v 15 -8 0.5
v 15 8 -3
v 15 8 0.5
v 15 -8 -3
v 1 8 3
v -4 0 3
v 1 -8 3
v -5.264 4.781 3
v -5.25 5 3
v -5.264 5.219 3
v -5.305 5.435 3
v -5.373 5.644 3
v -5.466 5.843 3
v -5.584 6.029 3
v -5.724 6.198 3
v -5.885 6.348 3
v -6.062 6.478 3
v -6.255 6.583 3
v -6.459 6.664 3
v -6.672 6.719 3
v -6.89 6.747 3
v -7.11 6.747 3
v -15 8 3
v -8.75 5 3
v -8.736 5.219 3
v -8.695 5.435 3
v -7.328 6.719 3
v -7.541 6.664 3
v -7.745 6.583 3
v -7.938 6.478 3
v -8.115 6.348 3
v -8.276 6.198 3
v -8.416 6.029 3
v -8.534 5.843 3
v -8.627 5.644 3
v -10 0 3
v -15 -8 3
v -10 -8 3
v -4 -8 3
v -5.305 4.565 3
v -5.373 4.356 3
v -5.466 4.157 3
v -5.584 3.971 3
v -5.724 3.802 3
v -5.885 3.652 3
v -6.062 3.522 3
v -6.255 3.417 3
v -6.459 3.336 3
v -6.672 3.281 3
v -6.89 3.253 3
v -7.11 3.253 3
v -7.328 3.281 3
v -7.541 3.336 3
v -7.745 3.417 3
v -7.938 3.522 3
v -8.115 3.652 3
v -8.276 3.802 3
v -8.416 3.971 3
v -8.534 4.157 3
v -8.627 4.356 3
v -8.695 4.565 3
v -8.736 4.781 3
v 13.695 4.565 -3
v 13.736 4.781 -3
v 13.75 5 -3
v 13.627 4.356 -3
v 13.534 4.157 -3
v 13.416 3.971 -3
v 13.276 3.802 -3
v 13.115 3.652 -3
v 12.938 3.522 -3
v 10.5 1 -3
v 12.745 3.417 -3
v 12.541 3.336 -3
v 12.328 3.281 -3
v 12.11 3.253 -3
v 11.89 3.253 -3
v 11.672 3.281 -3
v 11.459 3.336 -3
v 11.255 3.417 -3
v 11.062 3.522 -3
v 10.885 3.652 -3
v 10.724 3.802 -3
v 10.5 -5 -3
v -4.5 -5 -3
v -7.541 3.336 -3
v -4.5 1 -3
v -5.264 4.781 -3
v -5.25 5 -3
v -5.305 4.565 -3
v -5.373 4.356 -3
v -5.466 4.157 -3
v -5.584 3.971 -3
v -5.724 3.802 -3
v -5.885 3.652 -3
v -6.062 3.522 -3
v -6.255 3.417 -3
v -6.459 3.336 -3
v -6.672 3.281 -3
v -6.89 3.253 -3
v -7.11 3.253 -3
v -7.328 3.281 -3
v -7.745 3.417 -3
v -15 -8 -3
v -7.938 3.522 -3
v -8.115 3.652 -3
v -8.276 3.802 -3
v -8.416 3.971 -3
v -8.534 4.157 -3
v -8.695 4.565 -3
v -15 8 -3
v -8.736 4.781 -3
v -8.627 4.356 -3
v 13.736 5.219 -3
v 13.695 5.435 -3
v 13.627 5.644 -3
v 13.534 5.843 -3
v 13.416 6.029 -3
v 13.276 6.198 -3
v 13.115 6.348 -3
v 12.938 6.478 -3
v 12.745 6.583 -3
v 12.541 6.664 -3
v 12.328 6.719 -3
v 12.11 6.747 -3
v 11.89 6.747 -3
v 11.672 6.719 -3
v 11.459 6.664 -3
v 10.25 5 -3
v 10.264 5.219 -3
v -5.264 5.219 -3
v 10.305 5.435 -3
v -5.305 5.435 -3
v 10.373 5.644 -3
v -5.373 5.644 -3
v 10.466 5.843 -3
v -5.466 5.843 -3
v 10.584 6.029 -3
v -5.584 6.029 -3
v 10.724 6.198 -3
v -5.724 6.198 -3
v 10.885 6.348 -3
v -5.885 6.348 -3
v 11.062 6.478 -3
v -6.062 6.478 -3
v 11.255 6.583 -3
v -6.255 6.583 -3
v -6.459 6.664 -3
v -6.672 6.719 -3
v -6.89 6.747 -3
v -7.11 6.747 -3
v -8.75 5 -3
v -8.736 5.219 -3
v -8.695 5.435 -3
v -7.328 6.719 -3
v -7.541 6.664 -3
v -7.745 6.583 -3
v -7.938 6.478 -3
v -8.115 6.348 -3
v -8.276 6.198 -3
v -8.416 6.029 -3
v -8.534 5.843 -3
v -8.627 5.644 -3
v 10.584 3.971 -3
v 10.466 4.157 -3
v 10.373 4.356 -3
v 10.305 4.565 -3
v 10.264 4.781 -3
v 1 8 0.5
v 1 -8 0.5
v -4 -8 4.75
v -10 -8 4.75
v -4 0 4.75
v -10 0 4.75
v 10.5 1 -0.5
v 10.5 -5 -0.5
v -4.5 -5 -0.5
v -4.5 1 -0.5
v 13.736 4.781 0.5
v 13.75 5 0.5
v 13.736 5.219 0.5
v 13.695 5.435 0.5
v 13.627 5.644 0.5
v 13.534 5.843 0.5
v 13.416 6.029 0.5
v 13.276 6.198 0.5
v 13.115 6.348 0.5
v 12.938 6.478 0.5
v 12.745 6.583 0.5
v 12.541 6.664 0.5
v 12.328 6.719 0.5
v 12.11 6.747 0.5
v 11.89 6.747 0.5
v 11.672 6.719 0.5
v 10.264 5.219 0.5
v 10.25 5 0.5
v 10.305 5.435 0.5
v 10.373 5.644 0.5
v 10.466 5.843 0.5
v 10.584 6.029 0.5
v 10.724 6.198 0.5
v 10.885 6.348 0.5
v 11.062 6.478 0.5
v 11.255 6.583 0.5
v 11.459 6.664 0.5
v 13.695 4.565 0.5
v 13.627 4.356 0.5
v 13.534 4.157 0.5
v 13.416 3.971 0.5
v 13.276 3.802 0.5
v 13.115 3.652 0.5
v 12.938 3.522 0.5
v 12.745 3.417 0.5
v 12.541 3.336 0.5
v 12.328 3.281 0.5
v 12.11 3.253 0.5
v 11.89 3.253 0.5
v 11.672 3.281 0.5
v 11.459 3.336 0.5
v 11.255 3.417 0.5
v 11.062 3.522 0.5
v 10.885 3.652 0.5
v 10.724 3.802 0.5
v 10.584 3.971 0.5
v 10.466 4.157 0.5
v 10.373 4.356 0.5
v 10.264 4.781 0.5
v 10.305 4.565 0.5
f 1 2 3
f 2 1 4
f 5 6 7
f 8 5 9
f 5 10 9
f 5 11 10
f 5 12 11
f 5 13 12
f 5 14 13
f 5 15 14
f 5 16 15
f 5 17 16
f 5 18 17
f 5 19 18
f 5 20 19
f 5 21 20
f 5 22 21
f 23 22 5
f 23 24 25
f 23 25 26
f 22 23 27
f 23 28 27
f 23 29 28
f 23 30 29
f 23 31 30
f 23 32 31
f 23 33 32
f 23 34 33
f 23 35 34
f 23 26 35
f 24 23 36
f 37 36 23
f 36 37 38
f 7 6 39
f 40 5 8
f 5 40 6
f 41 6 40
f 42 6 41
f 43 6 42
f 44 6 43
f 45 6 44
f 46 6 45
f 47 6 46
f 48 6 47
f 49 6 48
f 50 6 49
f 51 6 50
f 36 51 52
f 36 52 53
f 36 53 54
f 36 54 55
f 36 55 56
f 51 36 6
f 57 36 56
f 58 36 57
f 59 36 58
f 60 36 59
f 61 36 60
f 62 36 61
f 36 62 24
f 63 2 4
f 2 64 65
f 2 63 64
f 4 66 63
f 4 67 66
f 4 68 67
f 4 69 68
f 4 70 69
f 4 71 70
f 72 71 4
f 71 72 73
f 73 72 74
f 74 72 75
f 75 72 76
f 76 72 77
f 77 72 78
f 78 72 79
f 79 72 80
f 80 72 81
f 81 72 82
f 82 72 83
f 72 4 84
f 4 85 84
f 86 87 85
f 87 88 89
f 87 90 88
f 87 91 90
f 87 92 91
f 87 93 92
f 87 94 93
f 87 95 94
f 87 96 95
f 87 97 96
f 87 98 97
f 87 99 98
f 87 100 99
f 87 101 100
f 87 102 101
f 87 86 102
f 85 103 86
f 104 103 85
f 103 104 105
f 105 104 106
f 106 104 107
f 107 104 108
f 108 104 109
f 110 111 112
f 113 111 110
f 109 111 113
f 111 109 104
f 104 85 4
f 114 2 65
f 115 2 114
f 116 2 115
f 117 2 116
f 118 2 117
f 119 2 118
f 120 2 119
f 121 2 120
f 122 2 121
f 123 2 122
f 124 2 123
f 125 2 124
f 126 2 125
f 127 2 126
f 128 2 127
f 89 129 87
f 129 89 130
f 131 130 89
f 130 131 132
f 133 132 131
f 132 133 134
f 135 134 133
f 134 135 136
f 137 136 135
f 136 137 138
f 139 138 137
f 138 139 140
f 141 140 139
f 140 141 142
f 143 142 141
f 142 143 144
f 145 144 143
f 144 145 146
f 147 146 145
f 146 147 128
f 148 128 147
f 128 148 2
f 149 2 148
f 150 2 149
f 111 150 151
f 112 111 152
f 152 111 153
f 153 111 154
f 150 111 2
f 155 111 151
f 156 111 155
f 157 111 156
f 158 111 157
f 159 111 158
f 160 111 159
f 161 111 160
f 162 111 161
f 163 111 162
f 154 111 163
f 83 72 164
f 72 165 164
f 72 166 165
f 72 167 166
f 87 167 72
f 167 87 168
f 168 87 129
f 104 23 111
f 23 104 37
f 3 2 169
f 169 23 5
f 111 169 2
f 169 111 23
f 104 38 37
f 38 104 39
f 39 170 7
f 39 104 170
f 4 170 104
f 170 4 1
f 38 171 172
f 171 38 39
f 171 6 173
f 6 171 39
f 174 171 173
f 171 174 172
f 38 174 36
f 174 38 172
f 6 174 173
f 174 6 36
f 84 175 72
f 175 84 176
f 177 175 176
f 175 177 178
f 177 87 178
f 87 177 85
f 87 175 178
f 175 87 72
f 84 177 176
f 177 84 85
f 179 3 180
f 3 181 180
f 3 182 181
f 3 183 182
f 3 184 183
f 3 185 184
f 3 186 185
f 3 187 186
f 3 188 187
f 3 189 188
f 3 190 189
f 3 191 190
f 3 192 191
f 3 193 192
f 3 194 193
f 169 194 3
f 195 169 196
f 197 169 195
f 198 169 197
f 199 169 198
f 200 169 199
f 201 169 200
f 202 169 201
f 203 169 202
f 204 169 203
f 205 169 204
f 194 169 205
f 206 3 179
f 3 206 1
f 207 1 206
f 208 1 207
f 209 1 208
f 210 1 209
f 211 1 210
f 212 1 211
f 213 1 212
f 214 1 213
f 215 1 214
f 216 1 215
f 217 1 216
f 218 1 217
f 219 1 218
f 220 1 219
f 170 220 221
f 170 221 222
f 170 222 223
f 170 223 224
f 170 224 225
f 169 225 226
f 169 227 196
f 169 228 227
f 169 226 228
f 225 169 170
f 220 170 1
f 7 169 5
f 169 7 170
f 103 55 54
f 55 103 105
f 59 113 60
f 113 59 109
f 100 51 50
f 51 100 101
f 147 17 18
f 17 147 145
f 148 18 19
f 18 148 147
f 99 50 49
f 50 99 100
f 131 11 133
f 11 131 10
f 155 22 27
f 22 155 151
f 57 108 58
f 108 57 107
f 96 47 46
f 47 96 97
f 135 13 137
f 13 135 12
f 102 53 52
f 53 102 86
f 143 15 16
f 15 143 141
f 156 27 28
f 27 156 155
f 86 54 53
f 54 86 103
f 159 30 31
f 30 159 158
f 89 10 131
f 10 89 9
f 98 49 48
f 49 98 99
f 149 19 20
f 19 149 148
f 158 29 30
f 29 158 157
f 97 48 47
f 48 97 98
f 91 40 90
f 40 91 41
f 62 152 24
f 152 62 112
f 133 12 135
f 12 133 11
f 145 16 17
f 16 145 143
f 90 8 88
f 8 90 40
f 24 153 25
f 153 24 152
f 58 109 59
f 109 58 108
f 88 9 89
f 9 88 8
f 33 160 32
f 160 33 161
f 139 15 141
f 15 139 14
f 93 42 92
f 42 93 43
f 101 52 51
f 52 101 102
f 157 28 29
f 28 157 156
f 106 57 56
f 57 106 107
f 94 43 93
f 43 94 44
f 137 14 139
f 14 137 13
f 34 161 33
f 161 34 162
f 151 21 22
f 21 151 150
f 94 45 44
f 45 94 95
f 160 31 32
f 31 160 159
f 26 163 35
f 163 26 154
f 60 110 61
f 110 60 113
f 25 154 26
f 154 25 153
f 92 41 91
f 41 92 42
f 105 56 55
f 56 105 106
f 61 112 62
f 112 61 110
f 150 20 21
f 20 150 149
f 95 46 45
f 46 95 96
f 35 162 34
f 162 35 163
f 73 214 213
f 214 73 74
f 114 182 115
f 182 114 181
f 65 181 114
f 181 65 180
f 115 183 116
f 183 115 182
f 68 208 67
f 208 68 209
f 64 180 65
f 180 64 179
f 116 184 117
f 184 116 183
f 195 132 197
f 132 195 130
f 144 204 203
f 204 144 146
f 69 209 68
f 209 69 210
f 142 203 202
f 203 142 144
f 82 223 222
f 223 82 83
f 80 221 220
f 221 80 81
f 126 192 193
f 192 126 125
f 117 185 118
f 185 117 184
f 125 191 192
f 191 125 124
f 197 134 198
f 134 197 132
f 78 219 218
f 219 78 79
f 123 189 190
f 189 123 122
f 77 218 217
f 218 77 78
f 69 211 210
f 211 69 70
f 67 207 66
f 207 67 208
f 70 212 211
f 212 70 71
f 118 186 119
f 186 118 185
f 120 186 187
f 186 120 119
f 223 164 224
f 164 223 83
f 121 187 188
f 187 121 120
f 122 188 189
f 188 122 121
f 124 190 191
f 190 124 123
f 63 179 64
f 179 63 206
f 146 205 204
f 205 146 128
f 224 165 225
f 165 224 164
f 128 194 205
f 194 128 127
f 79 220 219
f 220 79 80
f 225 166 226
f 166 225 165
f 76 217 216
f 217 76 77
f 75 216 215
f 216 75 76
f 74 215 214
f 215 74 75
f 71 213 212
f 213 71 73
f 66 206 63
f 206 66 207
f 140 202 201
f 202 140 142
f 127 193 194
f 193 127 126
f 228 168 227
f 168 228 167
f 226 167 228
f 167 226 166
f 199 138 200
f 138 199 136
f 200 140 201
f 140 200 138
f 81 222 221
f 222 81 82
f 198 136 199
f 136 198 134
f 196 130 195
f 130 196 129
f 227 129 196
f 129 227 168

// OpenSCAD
// Author: GrAndAG

/* [Settings] */

// Thickness of holder (mm)
thickness = 6; // [3:0.5:25]

//Economical version (requires less plastic)
economical = 1; // [0:No, 1:Yes]

// Diameters of mount holes (mm)
mount_hole_diameter = 3.5; // [2.7:0.1:4.0]

/* [Hidden] */
// to avoid renderring glitches
eps = 0.05;

module end_stop_holder() {
	$fn=50;

	difference() {
        // main body with tip
		union() {
			cube([30, 16, thickness], center = true);
			translate([-7, -4, thickness/2])
				cube([6, 8, 3.5], center = true);
		}

        // hole for contacts on back side of PCB
		translate([3, -2, -thickness/2 + 1.25 - eps/4])
			cube([15, 6, 2.5+eps/2], center = true);

        //cut some unneeded plastic
        if(economical)
            translate([8+eps/4, 0, 3.5])
                cube([14+eps/2, 16+eps, thickness], center = true);

        // two mount holes
		translate([-7, 5, 0])
			cylinder(h=thickness+eps, d=mount_hole_diameter, center = true);
		translate([12, 5, 0])
			cylinder(h=thickness+eps, d=mount_hole_diameter, center = true);
	}
}

end_stop_holder();

